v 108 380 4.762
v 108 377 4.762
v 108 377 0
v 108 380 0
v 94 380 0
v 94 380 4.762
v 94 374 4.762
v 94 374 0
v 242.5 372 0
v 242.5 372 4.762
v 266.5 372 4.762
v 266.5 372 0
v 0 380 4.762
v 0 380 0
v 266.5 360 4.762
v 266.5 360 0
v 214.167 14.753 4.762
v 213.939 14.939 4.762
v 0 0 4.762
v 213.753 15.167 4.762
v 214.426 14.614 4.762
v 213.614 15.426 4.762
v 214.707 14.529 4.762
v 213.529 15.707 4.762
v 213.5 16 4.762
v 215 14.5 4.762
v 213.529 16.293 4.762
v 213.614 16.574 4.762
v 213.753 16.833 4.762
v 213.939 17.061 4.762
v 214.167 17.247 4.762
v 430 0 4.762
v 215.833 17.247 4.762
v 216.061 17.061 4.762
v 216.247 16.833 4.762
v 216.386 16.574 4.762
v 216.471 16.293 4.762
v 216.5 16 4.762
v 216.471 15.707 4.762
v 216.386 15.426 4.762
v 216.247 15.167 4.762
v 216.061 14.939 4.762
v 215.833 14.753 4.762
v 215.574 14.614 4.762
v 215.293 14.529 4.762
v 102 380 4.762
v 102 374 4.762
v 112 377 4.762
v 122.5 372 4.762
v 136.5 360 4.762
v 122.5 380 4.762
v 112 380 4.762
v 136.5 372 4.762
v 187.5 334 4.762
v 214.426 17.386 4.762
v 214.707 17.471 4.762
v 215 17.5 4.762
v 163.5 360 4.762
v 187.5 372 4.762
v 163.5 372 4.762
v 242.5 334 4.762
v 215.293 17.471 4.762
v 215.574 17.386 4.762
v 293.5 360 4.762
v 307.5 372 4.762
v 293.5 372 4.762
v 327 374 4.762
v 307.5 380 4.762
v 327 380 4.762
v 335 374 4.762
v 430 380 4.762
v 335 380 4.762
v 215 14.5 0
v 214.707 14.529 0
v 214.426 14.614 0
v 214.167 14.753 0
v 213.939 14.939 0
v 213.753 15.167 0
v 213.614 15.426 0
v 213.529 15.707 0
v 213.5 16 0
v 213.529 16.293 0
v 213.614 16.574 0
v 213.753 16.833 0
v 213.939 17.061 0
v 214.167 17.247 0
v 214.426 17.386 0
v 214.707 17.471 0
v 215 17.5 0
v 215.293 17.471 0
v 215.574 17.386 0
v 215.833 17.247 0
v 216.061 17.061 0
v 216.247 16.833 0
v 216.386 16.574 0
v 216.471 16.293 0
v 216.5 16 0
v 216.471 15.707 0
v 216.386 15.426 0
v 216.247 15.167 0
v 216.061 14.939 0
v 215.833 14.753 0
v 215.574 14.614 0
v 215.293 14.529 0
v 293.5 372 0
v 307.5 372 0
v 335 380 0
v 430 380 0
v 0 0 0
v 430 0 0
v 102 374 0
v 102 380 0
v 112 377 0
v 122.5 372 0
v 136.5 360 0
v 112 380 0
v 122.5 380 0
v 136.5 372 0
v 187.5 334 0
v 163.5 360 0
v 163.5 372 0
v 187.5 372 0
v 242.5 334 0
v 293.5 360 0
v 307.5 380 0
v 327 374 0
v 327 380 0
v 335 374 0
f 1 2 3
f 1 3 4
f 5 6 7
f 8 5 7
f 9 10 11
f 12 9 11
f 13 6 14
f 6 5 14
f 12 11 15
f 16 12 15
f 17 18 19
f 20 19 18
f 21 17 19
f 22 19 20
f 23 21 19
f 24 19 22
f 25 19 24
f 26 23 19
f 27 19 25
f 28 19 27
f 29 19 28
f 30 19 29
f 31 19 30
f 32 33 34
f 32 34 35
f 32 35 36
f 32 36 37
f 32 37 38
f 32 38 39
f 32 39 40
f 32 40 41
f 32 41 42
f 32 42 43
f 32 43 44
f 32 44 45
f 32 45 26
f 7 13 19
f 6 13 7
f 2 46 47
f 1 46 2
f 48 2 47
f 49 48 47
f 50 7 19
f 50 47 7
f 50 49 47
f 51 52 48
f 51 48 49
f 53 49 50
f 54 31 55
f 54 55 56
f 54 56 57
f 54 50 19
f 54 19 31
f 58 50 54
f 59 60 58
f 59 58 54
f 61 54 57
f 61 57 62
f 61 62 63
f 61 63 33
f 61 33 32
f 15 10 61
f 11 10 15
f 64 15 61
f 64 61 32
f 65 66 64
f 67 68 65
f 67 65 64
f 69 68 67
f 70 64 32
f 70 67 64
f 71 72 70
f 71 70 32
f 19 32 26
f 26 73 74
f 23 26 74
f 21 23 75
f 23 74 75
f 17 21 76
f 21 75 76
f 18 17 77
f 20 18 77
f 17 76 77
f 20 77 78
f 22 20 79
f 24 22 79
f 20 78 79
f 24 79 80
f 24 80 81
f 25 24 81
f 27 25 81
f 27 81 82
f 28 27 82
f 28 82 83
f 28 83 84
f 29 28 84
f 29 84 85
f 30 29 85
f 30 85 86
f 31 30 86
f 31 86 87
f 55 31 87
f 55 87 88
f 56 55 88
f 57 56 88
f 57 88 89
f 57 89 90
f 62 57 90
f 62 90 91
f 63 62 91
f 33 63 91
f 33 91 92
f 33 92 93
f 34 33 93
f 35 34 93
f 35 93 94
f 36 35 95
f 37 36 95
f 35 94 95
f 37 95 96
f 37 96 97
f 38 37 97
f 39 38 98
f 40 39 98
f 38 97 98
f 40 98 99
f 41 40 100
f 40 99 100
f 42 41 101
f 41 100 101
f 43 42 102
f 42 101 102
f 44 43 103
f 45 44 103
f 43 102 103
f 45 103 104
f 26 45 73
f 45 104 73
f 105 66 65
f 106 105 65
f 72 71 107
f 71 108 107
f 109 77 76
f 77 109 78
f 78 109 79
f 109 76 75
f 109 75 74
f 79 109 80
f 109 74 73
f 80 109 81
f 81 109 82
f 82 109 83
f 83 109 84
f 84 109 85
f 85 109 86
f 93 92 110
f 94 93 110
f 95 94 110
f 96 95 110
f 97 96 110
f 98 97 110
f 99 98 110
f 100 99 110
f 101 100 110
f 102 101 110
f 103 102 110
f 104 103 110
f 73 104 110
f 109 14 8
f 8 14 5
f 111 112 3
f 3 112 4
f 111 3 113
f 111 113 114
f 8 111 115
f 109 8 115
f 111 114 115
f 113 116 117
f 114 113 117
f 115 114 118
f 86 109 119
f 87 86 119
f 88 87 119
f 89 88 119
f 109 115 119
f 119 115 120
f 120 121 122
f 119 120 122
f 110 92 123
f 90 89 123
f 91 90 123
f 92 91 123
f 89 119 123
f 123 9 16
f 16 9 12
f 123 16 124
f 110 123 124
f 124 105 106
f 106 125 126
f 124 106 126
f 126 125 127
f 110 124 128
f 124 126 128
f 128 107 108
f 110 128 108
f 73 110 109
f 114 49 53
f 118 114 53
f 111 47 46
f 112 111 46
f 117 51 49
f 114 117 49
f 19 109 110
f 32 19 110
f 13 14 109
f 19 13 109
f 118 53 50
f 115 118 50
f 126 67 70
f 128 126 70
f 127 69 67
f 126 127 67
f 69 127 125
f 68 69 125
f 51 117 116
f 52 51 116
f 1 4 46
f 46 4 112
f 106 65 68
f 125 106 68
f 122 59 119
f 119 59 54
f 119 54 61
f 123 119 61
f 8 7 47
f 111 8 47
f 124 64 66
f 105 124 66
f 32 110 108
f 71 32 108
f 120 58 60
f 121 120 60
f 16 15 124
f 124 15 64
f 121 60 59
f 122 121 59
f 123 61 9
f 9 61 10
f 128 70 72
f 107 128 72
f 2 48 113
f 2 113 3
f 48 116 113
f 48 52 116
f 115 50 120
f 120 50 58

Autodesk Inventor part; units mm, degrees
ref_plane "YZ Plane" through (0, 0, 0) normal (1, 0, 0) x (0, 1, 0)
ref_plane "XZ Plane" through (0, 0, 0) normal (0, 1, 0) x (-1, 0, 0)
ref_plane "XY Plane" through (0, 0, 0) normal (0, 0, 1) x (1, 0, 0)
sketch "Sketch1" plane through (0, 0, 0) normal (0, 0, 1) x (1, 0, 0)
  line L0 (0, 0) -> (430, 0)
  line L1 (430, 0) -> (430, 380)
  line L2 (430, 380) -> (0, 380)
  line L3 (0, 380) -> (0, 0)
  dimension "d0" = 430
  dimension "d1" = 380
extrude "Extrusion1" add sketch "Sketch1" along normal blind 4.7625
sketch "Sketch2" plane through (0, 0, 4.7625) normal (0, 0, 1) x (1, 0, 0)
  line L0 (0, 0) -> (430, 0) projected
  line L1 (430, 0) -> (430, 380) projected
  point P0 (215, 16)
  dimension "d8" = 215
  dimension "d33" = 16
hole "Hole1" at (215, 16, 4.7625) direction (0, 0, -1) diameter 3 end through all
sketch "Sketch4" plane through (0, 0, 4.7625) normal (0, 0, 1) x (1, 0, 0)
  line L0 (430, 380) -> (0, 380) projected
  line L1 (122.5, 380) -> (122.5, 372)
  line L2 (122.5, 372) -> (136.5, 372)
  line L3 (136.5, 372) -> (136.5, 360)
  line L4 (136.5, 360) -> (163.5, 360)
  line L5 (163.5, 360) -> (163.5, 372)
  line L6 (163.5, 372) -> (187.5, 372)
  line L7 (187.5, 372) -> (187.5, 334)
  line L8 (187.5, 334) -> (242.5, 334)
  line L9 (242.5, 334) -> (242.5, 372)
  line L10 (242.5, 372) -> (266.5, 372)
  line L11 (266.5, 372) -> (266.5, 360)
  line L12 (266.5, 360) -> (293.5, 360)
  line L13 (293.5, 360) -> (293.5, 372)
  line L14 (293.5, 372) -> (307.5, 372)
  line L15 (307.5, 372) -> (307.5, 380)
  point P0 (215, 380)
  point P1 (215, 334)
  dimension "d20" = 14
  dimension "d21" = 8
  dimension "d22" = 12
  dimension "d23" = 14
  dimension "d24" = 27
  dimension "d25" = 27
  dimension "d26" = 24
  dimension "d27" = 38
  dimension "d28" = 24
  dimension "d31" = 55
extrude "Extrusion2" cut sketch "Sketch4" against normal up to next
sketch "Sketch5" plane through (0, 0, 4.7625) normal (0, 0, 1) x (1, 0, 0)
  line L0 (122.5, 380) -> (0, 380) projected
  line L1 (0, 380) -> (0, 0) projected
  line L2 (430, 0) -> (430, 380) projected
  line L3 (430, 380) -> (307.5, 380) projected
  line L4 (94, 380) -> (94, 374)
  line L5 (94, 374) -> (102, 374)
  line L6 (102, 374) -> (102, 380)
  line L7 (327, 380) -> (327, 374)
  line L8 (327, 374) -> (335, 374)
  line L9 (335, 374) -> (335, 380)
  dimension "d36" = 8
  dimension "d37" = 94
  dimension "d38" = 6
  dimension "d39" = 95
extrude "Extrusion3" cut sketch "Sketch5" against normal up to next
sketch "Sketch6" plane through (0, 0, 4.7625) normal (0, 0, 1) x (1, 0, 0)
  line L0 (102, 380) -> (102, 374) projected
  line L1 (122.5, 380) -> (102, 380) projected
  line L2 (108, 380) -> (112, 380)
  line L3 (112, 380) -> (112, 377)
  line L4 (112, 377) -> (108, 377)
  line L5 (108, 377) -> (108, 380)
  dimension "d46" = 4
  dimension "d47" = 3
  dimension "d48" = 6
extrude "Extrusion4" cut sketch "Sketch6" against normal up to next
properties part number "ElectronicsTopPanel" material "ABS Plastic"
